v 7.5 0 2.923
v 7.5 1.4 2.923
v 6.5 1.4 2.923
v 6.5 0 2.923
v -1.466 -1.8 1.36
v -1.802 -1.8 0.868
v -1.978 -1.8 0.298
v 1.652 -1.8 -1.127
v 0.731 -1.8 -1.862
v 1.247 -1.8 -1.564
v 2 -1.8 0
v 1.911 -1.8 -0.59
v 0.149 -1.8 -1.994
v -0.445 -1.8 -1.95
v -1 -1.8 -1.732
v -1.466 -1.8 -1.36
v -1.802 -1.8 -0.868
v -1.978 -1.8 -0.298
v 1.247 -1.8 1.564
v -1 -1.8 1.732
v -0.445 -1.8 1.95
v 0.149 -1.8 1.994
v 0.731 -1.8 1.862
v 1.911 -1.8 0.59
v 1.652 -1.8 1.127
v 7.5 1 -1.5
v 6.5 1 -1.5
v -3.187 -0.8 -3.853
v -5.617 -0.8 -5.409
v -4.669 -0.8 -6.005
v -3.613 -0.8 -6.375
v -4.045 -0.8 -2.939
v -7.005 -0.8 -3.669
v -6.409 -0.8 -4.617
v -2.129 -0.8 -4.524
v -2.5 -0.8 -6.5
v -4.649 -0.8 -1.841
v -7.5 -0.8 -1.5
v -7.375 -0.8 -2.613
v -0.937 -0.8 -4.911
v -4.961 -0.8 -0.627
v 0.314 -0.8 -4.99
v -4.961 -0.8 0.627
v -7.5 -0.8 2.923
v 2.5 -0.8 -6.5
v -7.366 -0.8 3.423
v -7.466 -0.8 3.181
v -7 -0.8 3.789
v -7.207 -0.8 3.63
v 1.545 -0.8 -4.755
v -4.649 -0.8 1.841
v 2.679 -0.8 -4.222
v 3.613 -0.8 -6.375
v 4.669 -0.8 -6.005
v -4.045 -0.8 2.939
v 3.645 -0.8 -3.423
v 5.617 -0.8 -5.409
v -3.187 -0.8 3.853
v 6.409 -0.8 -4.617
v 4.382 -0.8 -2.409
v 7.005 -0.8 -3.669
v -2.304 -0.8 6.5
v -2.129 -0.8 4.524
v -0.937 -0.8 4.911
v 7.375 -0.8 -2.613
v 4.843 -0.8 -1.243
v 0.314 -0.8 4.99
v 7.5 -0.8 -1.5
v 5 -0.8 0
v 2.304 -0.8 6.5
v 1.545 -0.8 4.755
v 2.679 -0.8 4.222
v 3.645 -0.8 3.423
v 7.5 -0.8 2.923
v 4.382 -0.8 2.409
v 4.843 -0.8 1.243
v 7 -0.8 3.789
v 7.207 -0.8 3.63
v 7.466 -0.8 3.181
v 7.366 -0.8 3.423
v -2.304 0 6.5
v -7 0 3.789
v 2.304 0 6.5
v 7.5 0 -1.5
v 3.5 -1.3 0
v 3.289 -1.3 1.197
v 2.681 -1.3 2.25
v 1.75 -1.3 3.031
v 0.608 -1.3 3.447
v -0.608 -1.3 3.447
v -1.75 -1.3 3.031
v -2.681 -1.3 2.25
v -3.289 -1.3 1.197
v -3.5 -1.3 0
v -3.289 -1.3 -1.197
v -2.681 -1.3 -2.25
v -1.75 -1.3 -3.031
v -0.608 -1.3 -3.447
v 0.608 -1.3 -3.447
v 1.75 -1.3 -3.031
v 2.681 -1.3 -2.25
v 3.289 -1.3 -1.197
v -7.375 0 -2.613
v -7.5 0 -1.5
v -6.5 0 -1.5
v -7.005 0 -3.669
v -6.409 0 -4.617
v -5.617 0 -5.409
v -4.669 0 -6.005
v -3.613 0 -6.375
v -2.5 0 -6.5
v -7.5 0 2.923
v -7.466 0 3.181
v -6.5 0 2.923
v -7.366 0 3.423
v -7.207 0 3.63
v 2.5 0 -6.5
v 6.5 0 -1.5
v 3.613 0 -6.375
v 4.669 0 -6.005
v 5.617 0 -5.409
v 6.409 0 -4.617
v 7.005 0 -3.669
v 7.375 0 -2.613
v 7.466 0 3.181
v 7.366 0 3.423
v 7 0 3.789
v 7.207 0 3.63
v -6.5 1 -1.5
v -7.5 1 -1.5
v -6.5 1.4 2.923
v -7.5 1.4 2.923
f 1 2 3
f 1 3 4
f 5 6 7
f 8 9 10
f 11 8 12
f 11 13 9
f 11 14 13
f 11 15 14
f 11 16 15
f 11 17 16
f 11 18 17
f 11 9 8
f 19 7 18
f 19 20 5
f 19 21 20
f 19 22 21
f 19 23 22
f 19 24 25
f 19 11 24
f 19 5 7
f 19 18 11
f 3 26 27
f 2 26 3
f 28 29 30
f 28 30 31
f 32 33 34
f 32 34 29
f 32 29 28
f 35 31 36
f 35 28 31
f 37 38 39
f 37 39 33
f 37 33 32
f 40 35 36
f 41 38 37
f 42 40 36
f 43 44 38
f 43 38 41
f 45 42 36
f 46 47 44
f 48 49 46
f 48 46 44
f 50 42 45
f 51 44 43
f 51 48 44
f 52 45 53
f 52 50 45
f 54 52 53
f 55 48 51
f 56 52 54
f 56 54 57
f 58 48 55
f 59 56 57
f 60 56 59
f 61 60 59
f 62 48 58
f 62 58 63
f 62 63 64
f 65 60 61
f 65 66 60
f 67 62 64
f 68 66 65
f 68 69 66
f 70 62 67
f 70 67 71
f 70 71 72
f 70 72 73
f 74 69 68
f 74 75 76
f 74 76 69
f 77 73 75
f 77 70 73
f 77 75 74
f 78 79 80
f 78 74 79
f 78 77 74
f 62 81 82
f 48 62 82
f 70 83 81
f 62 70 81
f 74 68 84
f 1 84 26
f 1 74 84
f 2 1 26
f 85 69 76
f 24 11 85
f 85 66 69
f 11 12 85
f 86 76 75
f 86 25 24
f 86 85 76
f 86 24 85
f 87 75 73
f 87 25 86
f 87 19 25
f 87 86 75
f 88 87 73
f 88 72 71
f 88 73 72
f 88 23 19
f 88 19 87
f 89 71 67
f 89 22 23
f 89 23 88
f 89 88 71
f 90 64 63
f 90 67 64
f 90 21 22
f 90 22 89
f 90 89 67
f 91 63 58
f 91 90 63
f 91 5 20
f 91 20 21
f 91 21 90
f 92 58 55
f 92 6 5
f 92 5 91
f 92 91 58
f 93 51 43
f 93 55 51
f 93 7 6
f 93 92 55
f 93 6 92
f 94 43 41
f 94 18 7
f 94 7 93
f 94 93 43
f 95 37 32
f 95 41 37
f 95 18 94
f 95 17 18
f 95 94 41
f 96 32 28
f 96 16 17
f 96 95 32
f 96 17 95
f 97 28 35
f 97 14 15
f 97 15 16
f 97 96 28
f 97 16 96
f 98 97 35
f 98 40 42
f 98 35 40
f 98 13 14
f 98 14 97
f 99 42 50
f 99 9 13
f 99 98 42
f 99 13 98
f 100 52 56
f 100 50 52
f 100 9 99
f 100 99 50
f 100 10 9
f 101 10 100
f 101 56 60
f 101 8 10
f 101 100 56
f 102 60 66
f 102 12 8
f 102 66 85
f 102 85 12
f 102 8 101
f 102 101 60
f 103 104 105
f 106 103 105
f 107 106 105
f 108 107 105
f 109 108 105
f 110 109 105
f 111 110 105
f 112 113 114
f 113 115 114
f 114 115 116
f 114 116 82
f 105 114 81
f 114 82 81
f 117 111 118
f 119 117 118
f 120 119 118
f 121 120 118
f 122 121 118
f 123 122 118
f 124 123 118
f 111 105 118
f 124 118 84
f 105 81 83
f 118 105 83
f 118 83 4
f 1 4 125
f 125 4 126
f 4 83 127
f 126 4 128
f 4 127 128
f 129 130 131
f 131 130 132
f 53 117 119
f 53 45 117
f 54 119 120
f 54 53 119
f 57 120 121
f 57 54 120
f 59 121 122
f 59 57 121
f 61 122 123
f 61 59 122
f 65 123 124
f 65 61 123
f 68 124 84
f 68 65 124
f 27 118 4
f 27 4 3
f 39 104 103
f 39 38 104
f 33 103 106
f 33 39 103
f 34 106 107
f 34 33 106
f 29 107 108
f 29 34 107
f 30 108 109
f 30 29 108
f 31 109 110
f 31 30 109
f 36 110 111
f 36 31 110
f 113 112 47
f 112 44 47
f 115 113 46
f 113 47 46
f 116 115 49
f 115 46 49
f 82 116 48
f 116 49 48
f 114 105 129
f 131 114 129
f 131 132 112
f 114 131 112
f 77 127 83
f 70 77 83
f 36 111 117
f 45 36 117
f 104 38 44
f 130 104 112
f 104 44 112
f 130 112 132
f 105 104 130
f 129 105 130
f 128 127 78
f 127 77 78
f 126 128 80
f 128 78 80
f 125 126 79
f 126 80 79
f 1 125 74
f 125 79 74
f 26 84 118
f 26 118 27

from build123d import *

# Parameters (mm, degrees)
F1_DEPTH = 0.8
F2_R     = 5
F3_R     = 1
F4_R     = 5
F5_DEPTH = 1
F6_SIZE2 = 2.99999
F6_SIZE  = 0.99999
F8_DEPTH = 1


# Not quite as in the source:
# - a fillet or chamfer is up to 0.001 mm smaller than in the source, because OpenCascade refuses the exact size


with BuildPart() as f1:
    # F0 (on Front) → F1 (new body)
    with BuildSketch(Plane.XZ):
        Polygon((7.5, 3.5), (2.3038475773, 6.5), (-2.3038475773, 6.5), (-7.5, 3.5), (-7.5, -6.5), (7.5, -6.5), align=None)
    extrude(amount=F1_DEPTH)

    # F2
    f2_edges = [f1.edges().sort_by_distance(p)[0] for p in [
        (7.5, -0.4, -6.5),
        (-7.5, -0.4, -6.5),
    ]]
    fillet(f2_edges, radius=F2_R)

    # F3
    f3_edges = [f1.edges().sort_by_distance(p)[0] for p in [
        (7.5, -0.4, 3.5),
        (-7.5, -0.4, 3.5),
    ]]
    fillet(f3_edges, radius=F3_R)

    # F4 (on face) → F5 (join)
    with BuildSketch(Plane.XZ.offset(0.8)):
        Circle(F4_R)
    extrude(amount=F5_DEPTH)

    # F6 (size 1 and 3 in the source; OpenCascade refuses exactly that, so slightly less here)
    f6_edges = [f1.edges().sort_by_distance(p)[0] for p in [
        (-5, -1.8, 0),
    ]]
    f6_side = f1.faces().sort_by_distance((-5, -1.3, 0))[0]
    chamfer(f6_edges, length=F6_SIZE, length2=F6_SIZE2, reference=f6_side)

    # F7 (on face) → F8 (join)
    with BuildSketch(Plane.YZ.offset(7.5)):
        Polygon((1.4, 2.9226497308), (0, 2.9226497308), (0, -1.5), (1, -1.5), align=None)
    extrude(amount=-F8_DEPTH)

    # F9: F1 across plane


with BuildPart() as f1_1:
    add(f1.part)
    add(f1.part.mirror(Plane.YZ))


solid = f1_1.part
